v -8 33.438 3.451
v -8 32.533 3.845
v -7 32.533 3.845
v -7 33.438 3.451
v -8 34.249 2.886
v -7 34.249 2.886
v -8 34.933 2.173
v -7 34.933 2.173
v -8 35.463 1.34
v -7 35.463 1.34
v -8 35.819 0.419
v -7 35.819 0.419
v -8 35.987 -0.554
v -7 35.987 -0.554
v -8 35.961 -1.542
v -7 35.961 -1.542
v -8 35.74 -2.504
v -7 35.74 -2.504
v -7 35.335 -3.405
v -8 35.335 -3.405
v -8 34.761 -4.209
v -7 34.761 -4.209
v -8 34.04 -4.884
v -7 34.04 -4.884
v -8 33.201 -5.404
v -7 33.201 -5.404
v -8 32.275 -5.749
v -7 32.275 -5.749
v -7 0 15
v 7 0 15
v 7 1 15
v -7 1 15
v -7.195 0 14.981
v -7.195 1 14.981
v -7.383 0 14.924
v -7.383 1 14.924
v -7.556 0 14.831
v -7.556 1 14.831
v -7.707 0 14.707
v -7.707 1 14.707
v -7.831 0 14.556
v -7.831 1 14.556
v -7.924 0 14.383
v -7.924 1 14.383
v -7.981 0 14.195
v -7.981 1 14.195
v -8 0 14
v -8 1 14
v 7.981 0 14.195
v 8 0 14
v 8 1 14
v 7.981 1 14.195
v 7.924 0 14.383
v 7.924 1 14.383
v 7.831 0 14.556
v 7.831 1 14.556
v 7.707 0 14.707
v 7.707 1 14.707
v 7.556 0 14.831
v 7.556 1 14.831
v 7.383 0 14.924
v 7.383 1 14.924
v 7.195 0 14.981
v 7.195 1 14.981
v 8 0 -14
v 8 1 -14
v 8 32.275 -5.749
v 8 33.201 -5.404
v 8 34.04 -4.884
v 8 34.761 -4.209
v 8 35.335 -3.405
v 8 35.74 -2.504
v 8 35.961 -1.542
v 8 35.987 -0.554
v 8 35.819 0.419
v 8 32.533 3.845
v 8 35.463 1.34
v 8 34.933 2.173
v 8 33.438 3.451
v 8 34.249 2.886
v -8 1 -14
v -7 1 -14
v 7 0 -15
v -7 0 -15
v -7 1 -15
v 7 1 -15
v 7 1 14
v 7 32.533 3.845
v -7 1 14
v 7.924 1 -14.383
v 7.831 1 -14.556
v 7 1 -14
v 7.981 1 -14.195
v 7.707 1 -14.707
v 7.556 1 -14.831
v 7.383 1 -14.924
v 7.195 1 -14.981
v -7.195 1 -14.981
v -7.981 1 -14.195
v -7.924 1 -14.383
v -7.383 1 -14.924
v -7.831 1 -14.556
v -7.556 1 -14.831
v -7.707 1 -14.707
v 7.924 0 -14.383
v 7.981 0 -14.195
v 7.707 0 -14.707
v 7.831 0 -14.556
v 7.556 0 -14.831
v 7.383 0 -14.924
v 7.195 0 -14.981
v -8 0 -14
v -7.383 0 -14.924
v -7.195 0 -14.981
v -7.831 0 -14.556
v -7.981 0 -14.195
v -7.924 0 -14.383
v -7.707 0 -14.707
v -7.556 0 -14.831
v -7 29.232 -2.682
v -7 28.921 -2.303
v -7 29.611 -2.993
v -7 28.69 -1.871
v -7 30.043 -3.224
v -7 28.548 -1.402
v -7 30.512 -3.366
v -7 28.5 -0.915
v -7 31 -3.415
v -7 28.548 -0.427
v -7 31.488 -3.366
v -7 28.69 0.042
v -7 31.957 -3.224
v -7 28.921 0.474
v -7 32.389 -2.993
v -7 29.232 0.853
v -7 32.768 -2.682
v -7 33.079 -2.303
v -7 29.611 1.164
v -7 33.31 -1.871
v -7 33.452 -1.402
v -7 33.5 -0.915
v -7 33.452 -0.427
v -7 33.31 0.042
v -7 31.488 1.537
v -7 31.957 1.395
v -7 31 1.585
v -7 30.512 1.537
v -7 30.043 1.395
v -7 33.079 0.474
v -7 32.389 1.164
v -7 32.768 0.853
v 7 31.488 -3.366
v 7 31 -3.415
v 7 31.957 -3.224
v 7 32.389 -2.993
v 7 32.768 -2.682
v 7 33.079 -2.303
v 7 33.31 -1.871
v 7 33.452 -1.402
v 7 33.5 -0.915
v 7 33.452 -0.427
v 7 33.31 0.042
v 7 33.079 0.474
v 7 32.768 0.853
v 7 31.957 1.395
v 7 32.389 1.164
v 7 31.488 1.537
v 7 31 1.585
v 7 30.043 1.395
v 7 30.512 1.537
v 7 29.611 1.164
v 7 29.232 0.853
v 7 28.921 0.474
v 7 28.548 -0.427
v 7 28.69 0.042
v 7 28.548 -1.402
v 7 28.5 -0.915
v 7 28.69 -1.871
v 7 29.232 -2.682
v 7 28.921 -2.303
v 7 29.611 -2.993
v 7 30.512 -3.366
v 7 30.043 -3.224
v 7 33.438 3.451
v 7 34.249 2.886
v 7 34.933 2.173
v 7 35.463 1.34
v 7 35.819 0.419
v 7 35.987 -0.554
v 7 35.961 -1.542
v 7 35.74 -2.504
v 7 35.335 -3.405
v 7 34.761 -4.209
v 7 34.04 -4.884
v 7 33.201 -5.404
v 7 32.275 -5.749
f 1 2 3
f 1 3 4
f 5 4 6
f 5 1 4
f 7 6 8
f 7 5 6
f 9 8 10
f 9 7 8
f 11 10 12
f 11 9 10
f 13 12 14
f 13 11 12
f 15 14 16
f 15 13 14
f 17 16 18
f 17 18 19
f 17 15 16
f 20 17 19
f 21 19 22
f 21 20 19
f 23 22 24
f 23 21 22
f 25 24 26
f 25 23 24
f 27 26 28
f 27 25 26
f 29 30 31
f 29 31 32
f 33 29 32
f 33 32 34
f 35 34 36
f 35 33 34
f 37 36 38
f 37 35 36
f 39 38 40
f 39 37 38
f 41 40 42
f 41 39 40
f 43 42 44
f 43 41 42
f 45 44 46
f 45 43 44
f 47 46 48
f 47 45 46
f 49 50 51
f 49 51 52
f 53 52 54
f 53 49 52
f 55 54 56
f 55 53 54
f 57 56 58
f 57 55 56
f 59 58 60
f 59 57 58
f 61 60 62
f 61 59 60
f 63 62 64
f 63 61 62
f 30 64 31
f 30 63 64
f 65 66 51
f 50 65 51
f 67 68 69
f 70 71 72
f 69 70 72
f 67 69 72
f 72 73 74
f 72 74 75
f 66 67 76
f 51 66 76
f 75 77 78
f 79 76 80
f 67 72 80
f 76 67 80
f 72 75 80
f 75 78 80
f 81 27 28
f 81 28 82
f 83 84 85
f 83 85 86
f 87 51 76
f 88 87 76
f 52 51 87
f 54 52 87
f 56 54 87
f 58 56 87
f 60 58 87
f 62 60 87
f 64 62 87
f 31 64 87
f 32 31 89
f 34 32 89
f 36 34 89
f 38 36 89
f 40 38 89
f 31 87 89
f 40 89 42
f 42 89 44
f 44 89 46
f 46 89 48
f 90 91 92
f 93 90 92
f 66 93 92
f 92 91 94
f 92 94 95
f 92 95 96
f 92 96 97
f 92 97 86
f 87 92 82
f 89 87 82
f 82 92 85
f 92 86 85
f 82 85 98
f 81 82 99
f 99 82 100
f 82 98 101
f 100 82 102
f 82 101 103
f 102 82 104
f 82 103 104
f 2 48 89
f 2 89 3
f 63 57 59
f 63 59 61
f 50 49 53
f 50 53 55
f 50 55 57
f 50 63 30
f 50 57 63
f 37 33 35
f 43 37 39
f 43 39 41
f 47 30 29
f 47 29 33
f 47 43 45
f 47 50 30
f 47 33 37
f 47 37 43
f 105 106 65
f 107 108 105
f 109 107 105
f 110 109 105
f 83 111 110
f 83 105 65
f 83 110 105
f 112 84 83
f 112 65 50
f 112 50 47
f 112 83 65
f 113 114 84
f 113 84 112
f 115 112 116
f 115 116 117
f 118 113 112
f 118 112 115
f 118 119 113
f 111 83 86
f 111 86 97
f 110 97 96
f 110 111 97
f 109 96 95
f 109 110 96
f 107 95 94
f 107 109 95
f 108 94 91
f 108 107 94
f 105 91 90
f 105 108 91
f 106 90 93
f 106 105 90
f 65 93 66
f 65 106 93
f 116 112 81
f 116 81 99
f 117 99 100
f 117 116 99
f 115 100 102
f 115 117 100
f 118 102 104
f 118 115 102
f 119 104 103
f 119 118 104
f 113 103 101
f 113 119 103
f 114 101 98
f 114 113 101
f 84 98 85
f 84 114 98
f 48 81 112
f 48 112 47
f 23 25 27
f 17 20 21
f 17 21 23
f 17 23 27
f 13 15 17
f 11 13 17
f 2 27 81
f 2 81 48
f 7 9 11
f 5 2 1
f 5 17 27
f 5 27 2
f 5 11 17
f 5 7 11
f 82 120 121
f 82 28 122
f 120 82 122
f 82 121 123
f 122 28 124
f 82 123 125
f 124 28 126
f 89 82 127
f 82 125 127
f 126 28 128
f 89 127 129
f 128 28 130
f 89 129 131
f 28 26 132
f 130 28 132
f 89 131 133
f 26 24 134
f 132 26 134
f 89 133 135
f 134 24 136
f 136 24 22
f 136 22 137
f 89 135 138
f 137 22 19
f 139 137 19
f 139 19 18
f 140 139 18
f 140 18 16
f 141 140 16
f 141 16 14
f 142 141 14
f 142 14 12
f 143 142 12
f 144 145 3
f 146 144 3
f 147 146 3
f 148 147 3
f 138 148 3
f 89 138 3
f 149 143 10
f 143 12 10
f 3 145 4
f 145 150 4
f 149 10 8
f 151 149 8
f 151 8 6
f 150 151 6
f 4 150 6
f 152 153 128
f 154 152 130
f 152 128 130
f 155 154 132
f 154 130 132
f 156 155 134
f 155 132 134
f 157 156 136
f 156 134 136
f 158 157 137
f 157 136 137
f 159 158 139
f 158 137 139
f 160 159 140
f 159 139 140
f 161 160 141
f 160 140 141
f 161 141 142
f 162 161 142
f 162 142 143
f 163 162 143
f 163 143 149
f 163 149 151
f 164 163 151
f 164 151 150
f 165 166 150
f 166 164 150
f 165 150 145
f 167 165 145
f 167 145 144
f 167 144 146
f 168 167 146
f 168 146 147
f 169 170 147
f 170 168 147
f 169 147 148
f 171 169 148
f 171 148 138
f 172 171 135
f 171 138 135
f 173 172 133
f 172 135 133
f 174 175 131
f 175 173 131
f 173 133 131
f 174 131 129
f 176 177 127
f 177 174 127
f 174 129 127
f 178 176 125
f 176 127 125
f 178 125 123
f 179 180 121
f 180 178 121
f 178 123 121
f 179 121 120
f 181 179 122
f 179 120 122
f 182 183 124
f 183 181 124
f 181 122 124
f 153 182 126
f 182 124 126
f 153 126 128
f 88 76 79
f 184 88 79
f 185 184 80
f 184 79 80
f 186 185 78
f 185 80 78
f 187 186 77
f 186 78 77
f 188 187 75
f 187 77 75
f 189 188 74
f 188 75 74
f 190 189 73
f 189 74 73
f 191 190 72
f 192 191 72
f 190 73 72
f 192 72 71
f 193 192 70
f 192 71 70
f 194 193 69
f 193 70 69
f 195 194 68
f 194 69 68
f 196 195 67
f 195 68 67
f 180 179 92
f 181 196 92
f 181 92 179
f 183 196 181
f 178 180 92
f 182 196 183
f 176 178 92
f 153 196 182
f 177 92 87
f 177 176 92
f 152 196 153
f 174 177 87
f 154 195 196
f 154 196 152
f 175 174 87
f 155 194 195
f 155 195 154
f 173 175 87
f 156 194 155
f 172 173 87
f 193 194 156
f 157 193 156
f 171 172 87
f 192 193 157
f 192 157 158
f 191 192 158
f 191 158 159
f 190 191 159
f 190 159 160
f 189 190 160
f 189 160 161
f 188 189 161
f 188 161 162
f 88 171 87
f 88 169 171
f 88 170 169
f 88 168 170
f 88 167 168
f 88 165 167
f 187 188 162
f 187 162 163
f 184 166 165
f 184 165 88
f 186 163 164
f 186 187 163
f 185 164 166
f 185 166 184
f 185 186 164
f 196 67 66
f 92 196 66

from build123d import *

# Parameters (mm, degrees)
EXTRUDE_1_DEPTH = 1
EXTRUDE_2_DEPTH = 1
EXTRUDE_3_REACH = 17
SKETCH_3_R      = 2.5


with BuildPart() as part:
    # 草图1 → 凸台-拉伸1 (new body)
    with BuildSketch(Plane(origin=(0, 0, 0), x_dir=(1, 0, 0), z_dir=(0, 1, 0))):
        with BuildLine():
            Line((-7, 15), (7, 15))
            ThreePointArc((7, 15), (7.707106781, 14.707106781), (8, 14))
            Line((8, 14), (8, -14))
            ThreePointArc((8, -14), (7.707106781, -14.707106781), (7, -15))
            Line((7, -15), (-7, -15))
            ThreePointArc((-7, -15), (-7.707106781, -14.707106781), (-8, -14))
            Line((-8, -14), (-8, 14))
            ThreePointArc((-8, 14), (-7.707106781, 14.707106781), (-7, 15))
        make_face()
    extrude(amount=EXTRUDE_1_DEPTH)

    # 草图2 → 凸台-拉伸2 (add)
    with BuildSketch(Plane.ZY.offset(8)):
        with BuildLine():
            Line((14, 1), (3.844755362, 32.532743309))
            ThreePointArc((3.844755362, 32.532743309), (-1.048573514, 35.998202631), (-5.749110975, 32.275431702))
            Line((-5.749110975, 32.275431702), (-14, 1))
            Line((-14, 1), (14, 1))
        make_face()
    extrude_2 = extrude(amount=-EXTRUDE_2_DEPTH)

    # 镜向1: 凸台-拉伸2 across plane
    add(extrude_2.mirror(Plane(origin=(0, 0, 0), x_dir=(0, 0, 1), z_dir=(1, 0, 0))))

    # 草图3 → 凸台-拉伸3 (add, up to next)
    with BuildSketch(Plane(origin=(-7, 0, 0), x_dir=(0, 0, -1), z_dir=(1, 0, 0)), mode=Mode.PRIVATE) as extrude_3_sk1:
        with Locations((0.914519578, 31)):
            Circle(SKETCH_3_R)
    extrude_3_tool1 = extrude(extrude_3_sk1.sketch, amount=EXTRUDE_3_REACH, mode=Mode.PRIVATE) - part.part
    add(extrude_3_tool1.solids().sort_by_distance((-7, 31, -0.91452))[0])


solid = part.part
